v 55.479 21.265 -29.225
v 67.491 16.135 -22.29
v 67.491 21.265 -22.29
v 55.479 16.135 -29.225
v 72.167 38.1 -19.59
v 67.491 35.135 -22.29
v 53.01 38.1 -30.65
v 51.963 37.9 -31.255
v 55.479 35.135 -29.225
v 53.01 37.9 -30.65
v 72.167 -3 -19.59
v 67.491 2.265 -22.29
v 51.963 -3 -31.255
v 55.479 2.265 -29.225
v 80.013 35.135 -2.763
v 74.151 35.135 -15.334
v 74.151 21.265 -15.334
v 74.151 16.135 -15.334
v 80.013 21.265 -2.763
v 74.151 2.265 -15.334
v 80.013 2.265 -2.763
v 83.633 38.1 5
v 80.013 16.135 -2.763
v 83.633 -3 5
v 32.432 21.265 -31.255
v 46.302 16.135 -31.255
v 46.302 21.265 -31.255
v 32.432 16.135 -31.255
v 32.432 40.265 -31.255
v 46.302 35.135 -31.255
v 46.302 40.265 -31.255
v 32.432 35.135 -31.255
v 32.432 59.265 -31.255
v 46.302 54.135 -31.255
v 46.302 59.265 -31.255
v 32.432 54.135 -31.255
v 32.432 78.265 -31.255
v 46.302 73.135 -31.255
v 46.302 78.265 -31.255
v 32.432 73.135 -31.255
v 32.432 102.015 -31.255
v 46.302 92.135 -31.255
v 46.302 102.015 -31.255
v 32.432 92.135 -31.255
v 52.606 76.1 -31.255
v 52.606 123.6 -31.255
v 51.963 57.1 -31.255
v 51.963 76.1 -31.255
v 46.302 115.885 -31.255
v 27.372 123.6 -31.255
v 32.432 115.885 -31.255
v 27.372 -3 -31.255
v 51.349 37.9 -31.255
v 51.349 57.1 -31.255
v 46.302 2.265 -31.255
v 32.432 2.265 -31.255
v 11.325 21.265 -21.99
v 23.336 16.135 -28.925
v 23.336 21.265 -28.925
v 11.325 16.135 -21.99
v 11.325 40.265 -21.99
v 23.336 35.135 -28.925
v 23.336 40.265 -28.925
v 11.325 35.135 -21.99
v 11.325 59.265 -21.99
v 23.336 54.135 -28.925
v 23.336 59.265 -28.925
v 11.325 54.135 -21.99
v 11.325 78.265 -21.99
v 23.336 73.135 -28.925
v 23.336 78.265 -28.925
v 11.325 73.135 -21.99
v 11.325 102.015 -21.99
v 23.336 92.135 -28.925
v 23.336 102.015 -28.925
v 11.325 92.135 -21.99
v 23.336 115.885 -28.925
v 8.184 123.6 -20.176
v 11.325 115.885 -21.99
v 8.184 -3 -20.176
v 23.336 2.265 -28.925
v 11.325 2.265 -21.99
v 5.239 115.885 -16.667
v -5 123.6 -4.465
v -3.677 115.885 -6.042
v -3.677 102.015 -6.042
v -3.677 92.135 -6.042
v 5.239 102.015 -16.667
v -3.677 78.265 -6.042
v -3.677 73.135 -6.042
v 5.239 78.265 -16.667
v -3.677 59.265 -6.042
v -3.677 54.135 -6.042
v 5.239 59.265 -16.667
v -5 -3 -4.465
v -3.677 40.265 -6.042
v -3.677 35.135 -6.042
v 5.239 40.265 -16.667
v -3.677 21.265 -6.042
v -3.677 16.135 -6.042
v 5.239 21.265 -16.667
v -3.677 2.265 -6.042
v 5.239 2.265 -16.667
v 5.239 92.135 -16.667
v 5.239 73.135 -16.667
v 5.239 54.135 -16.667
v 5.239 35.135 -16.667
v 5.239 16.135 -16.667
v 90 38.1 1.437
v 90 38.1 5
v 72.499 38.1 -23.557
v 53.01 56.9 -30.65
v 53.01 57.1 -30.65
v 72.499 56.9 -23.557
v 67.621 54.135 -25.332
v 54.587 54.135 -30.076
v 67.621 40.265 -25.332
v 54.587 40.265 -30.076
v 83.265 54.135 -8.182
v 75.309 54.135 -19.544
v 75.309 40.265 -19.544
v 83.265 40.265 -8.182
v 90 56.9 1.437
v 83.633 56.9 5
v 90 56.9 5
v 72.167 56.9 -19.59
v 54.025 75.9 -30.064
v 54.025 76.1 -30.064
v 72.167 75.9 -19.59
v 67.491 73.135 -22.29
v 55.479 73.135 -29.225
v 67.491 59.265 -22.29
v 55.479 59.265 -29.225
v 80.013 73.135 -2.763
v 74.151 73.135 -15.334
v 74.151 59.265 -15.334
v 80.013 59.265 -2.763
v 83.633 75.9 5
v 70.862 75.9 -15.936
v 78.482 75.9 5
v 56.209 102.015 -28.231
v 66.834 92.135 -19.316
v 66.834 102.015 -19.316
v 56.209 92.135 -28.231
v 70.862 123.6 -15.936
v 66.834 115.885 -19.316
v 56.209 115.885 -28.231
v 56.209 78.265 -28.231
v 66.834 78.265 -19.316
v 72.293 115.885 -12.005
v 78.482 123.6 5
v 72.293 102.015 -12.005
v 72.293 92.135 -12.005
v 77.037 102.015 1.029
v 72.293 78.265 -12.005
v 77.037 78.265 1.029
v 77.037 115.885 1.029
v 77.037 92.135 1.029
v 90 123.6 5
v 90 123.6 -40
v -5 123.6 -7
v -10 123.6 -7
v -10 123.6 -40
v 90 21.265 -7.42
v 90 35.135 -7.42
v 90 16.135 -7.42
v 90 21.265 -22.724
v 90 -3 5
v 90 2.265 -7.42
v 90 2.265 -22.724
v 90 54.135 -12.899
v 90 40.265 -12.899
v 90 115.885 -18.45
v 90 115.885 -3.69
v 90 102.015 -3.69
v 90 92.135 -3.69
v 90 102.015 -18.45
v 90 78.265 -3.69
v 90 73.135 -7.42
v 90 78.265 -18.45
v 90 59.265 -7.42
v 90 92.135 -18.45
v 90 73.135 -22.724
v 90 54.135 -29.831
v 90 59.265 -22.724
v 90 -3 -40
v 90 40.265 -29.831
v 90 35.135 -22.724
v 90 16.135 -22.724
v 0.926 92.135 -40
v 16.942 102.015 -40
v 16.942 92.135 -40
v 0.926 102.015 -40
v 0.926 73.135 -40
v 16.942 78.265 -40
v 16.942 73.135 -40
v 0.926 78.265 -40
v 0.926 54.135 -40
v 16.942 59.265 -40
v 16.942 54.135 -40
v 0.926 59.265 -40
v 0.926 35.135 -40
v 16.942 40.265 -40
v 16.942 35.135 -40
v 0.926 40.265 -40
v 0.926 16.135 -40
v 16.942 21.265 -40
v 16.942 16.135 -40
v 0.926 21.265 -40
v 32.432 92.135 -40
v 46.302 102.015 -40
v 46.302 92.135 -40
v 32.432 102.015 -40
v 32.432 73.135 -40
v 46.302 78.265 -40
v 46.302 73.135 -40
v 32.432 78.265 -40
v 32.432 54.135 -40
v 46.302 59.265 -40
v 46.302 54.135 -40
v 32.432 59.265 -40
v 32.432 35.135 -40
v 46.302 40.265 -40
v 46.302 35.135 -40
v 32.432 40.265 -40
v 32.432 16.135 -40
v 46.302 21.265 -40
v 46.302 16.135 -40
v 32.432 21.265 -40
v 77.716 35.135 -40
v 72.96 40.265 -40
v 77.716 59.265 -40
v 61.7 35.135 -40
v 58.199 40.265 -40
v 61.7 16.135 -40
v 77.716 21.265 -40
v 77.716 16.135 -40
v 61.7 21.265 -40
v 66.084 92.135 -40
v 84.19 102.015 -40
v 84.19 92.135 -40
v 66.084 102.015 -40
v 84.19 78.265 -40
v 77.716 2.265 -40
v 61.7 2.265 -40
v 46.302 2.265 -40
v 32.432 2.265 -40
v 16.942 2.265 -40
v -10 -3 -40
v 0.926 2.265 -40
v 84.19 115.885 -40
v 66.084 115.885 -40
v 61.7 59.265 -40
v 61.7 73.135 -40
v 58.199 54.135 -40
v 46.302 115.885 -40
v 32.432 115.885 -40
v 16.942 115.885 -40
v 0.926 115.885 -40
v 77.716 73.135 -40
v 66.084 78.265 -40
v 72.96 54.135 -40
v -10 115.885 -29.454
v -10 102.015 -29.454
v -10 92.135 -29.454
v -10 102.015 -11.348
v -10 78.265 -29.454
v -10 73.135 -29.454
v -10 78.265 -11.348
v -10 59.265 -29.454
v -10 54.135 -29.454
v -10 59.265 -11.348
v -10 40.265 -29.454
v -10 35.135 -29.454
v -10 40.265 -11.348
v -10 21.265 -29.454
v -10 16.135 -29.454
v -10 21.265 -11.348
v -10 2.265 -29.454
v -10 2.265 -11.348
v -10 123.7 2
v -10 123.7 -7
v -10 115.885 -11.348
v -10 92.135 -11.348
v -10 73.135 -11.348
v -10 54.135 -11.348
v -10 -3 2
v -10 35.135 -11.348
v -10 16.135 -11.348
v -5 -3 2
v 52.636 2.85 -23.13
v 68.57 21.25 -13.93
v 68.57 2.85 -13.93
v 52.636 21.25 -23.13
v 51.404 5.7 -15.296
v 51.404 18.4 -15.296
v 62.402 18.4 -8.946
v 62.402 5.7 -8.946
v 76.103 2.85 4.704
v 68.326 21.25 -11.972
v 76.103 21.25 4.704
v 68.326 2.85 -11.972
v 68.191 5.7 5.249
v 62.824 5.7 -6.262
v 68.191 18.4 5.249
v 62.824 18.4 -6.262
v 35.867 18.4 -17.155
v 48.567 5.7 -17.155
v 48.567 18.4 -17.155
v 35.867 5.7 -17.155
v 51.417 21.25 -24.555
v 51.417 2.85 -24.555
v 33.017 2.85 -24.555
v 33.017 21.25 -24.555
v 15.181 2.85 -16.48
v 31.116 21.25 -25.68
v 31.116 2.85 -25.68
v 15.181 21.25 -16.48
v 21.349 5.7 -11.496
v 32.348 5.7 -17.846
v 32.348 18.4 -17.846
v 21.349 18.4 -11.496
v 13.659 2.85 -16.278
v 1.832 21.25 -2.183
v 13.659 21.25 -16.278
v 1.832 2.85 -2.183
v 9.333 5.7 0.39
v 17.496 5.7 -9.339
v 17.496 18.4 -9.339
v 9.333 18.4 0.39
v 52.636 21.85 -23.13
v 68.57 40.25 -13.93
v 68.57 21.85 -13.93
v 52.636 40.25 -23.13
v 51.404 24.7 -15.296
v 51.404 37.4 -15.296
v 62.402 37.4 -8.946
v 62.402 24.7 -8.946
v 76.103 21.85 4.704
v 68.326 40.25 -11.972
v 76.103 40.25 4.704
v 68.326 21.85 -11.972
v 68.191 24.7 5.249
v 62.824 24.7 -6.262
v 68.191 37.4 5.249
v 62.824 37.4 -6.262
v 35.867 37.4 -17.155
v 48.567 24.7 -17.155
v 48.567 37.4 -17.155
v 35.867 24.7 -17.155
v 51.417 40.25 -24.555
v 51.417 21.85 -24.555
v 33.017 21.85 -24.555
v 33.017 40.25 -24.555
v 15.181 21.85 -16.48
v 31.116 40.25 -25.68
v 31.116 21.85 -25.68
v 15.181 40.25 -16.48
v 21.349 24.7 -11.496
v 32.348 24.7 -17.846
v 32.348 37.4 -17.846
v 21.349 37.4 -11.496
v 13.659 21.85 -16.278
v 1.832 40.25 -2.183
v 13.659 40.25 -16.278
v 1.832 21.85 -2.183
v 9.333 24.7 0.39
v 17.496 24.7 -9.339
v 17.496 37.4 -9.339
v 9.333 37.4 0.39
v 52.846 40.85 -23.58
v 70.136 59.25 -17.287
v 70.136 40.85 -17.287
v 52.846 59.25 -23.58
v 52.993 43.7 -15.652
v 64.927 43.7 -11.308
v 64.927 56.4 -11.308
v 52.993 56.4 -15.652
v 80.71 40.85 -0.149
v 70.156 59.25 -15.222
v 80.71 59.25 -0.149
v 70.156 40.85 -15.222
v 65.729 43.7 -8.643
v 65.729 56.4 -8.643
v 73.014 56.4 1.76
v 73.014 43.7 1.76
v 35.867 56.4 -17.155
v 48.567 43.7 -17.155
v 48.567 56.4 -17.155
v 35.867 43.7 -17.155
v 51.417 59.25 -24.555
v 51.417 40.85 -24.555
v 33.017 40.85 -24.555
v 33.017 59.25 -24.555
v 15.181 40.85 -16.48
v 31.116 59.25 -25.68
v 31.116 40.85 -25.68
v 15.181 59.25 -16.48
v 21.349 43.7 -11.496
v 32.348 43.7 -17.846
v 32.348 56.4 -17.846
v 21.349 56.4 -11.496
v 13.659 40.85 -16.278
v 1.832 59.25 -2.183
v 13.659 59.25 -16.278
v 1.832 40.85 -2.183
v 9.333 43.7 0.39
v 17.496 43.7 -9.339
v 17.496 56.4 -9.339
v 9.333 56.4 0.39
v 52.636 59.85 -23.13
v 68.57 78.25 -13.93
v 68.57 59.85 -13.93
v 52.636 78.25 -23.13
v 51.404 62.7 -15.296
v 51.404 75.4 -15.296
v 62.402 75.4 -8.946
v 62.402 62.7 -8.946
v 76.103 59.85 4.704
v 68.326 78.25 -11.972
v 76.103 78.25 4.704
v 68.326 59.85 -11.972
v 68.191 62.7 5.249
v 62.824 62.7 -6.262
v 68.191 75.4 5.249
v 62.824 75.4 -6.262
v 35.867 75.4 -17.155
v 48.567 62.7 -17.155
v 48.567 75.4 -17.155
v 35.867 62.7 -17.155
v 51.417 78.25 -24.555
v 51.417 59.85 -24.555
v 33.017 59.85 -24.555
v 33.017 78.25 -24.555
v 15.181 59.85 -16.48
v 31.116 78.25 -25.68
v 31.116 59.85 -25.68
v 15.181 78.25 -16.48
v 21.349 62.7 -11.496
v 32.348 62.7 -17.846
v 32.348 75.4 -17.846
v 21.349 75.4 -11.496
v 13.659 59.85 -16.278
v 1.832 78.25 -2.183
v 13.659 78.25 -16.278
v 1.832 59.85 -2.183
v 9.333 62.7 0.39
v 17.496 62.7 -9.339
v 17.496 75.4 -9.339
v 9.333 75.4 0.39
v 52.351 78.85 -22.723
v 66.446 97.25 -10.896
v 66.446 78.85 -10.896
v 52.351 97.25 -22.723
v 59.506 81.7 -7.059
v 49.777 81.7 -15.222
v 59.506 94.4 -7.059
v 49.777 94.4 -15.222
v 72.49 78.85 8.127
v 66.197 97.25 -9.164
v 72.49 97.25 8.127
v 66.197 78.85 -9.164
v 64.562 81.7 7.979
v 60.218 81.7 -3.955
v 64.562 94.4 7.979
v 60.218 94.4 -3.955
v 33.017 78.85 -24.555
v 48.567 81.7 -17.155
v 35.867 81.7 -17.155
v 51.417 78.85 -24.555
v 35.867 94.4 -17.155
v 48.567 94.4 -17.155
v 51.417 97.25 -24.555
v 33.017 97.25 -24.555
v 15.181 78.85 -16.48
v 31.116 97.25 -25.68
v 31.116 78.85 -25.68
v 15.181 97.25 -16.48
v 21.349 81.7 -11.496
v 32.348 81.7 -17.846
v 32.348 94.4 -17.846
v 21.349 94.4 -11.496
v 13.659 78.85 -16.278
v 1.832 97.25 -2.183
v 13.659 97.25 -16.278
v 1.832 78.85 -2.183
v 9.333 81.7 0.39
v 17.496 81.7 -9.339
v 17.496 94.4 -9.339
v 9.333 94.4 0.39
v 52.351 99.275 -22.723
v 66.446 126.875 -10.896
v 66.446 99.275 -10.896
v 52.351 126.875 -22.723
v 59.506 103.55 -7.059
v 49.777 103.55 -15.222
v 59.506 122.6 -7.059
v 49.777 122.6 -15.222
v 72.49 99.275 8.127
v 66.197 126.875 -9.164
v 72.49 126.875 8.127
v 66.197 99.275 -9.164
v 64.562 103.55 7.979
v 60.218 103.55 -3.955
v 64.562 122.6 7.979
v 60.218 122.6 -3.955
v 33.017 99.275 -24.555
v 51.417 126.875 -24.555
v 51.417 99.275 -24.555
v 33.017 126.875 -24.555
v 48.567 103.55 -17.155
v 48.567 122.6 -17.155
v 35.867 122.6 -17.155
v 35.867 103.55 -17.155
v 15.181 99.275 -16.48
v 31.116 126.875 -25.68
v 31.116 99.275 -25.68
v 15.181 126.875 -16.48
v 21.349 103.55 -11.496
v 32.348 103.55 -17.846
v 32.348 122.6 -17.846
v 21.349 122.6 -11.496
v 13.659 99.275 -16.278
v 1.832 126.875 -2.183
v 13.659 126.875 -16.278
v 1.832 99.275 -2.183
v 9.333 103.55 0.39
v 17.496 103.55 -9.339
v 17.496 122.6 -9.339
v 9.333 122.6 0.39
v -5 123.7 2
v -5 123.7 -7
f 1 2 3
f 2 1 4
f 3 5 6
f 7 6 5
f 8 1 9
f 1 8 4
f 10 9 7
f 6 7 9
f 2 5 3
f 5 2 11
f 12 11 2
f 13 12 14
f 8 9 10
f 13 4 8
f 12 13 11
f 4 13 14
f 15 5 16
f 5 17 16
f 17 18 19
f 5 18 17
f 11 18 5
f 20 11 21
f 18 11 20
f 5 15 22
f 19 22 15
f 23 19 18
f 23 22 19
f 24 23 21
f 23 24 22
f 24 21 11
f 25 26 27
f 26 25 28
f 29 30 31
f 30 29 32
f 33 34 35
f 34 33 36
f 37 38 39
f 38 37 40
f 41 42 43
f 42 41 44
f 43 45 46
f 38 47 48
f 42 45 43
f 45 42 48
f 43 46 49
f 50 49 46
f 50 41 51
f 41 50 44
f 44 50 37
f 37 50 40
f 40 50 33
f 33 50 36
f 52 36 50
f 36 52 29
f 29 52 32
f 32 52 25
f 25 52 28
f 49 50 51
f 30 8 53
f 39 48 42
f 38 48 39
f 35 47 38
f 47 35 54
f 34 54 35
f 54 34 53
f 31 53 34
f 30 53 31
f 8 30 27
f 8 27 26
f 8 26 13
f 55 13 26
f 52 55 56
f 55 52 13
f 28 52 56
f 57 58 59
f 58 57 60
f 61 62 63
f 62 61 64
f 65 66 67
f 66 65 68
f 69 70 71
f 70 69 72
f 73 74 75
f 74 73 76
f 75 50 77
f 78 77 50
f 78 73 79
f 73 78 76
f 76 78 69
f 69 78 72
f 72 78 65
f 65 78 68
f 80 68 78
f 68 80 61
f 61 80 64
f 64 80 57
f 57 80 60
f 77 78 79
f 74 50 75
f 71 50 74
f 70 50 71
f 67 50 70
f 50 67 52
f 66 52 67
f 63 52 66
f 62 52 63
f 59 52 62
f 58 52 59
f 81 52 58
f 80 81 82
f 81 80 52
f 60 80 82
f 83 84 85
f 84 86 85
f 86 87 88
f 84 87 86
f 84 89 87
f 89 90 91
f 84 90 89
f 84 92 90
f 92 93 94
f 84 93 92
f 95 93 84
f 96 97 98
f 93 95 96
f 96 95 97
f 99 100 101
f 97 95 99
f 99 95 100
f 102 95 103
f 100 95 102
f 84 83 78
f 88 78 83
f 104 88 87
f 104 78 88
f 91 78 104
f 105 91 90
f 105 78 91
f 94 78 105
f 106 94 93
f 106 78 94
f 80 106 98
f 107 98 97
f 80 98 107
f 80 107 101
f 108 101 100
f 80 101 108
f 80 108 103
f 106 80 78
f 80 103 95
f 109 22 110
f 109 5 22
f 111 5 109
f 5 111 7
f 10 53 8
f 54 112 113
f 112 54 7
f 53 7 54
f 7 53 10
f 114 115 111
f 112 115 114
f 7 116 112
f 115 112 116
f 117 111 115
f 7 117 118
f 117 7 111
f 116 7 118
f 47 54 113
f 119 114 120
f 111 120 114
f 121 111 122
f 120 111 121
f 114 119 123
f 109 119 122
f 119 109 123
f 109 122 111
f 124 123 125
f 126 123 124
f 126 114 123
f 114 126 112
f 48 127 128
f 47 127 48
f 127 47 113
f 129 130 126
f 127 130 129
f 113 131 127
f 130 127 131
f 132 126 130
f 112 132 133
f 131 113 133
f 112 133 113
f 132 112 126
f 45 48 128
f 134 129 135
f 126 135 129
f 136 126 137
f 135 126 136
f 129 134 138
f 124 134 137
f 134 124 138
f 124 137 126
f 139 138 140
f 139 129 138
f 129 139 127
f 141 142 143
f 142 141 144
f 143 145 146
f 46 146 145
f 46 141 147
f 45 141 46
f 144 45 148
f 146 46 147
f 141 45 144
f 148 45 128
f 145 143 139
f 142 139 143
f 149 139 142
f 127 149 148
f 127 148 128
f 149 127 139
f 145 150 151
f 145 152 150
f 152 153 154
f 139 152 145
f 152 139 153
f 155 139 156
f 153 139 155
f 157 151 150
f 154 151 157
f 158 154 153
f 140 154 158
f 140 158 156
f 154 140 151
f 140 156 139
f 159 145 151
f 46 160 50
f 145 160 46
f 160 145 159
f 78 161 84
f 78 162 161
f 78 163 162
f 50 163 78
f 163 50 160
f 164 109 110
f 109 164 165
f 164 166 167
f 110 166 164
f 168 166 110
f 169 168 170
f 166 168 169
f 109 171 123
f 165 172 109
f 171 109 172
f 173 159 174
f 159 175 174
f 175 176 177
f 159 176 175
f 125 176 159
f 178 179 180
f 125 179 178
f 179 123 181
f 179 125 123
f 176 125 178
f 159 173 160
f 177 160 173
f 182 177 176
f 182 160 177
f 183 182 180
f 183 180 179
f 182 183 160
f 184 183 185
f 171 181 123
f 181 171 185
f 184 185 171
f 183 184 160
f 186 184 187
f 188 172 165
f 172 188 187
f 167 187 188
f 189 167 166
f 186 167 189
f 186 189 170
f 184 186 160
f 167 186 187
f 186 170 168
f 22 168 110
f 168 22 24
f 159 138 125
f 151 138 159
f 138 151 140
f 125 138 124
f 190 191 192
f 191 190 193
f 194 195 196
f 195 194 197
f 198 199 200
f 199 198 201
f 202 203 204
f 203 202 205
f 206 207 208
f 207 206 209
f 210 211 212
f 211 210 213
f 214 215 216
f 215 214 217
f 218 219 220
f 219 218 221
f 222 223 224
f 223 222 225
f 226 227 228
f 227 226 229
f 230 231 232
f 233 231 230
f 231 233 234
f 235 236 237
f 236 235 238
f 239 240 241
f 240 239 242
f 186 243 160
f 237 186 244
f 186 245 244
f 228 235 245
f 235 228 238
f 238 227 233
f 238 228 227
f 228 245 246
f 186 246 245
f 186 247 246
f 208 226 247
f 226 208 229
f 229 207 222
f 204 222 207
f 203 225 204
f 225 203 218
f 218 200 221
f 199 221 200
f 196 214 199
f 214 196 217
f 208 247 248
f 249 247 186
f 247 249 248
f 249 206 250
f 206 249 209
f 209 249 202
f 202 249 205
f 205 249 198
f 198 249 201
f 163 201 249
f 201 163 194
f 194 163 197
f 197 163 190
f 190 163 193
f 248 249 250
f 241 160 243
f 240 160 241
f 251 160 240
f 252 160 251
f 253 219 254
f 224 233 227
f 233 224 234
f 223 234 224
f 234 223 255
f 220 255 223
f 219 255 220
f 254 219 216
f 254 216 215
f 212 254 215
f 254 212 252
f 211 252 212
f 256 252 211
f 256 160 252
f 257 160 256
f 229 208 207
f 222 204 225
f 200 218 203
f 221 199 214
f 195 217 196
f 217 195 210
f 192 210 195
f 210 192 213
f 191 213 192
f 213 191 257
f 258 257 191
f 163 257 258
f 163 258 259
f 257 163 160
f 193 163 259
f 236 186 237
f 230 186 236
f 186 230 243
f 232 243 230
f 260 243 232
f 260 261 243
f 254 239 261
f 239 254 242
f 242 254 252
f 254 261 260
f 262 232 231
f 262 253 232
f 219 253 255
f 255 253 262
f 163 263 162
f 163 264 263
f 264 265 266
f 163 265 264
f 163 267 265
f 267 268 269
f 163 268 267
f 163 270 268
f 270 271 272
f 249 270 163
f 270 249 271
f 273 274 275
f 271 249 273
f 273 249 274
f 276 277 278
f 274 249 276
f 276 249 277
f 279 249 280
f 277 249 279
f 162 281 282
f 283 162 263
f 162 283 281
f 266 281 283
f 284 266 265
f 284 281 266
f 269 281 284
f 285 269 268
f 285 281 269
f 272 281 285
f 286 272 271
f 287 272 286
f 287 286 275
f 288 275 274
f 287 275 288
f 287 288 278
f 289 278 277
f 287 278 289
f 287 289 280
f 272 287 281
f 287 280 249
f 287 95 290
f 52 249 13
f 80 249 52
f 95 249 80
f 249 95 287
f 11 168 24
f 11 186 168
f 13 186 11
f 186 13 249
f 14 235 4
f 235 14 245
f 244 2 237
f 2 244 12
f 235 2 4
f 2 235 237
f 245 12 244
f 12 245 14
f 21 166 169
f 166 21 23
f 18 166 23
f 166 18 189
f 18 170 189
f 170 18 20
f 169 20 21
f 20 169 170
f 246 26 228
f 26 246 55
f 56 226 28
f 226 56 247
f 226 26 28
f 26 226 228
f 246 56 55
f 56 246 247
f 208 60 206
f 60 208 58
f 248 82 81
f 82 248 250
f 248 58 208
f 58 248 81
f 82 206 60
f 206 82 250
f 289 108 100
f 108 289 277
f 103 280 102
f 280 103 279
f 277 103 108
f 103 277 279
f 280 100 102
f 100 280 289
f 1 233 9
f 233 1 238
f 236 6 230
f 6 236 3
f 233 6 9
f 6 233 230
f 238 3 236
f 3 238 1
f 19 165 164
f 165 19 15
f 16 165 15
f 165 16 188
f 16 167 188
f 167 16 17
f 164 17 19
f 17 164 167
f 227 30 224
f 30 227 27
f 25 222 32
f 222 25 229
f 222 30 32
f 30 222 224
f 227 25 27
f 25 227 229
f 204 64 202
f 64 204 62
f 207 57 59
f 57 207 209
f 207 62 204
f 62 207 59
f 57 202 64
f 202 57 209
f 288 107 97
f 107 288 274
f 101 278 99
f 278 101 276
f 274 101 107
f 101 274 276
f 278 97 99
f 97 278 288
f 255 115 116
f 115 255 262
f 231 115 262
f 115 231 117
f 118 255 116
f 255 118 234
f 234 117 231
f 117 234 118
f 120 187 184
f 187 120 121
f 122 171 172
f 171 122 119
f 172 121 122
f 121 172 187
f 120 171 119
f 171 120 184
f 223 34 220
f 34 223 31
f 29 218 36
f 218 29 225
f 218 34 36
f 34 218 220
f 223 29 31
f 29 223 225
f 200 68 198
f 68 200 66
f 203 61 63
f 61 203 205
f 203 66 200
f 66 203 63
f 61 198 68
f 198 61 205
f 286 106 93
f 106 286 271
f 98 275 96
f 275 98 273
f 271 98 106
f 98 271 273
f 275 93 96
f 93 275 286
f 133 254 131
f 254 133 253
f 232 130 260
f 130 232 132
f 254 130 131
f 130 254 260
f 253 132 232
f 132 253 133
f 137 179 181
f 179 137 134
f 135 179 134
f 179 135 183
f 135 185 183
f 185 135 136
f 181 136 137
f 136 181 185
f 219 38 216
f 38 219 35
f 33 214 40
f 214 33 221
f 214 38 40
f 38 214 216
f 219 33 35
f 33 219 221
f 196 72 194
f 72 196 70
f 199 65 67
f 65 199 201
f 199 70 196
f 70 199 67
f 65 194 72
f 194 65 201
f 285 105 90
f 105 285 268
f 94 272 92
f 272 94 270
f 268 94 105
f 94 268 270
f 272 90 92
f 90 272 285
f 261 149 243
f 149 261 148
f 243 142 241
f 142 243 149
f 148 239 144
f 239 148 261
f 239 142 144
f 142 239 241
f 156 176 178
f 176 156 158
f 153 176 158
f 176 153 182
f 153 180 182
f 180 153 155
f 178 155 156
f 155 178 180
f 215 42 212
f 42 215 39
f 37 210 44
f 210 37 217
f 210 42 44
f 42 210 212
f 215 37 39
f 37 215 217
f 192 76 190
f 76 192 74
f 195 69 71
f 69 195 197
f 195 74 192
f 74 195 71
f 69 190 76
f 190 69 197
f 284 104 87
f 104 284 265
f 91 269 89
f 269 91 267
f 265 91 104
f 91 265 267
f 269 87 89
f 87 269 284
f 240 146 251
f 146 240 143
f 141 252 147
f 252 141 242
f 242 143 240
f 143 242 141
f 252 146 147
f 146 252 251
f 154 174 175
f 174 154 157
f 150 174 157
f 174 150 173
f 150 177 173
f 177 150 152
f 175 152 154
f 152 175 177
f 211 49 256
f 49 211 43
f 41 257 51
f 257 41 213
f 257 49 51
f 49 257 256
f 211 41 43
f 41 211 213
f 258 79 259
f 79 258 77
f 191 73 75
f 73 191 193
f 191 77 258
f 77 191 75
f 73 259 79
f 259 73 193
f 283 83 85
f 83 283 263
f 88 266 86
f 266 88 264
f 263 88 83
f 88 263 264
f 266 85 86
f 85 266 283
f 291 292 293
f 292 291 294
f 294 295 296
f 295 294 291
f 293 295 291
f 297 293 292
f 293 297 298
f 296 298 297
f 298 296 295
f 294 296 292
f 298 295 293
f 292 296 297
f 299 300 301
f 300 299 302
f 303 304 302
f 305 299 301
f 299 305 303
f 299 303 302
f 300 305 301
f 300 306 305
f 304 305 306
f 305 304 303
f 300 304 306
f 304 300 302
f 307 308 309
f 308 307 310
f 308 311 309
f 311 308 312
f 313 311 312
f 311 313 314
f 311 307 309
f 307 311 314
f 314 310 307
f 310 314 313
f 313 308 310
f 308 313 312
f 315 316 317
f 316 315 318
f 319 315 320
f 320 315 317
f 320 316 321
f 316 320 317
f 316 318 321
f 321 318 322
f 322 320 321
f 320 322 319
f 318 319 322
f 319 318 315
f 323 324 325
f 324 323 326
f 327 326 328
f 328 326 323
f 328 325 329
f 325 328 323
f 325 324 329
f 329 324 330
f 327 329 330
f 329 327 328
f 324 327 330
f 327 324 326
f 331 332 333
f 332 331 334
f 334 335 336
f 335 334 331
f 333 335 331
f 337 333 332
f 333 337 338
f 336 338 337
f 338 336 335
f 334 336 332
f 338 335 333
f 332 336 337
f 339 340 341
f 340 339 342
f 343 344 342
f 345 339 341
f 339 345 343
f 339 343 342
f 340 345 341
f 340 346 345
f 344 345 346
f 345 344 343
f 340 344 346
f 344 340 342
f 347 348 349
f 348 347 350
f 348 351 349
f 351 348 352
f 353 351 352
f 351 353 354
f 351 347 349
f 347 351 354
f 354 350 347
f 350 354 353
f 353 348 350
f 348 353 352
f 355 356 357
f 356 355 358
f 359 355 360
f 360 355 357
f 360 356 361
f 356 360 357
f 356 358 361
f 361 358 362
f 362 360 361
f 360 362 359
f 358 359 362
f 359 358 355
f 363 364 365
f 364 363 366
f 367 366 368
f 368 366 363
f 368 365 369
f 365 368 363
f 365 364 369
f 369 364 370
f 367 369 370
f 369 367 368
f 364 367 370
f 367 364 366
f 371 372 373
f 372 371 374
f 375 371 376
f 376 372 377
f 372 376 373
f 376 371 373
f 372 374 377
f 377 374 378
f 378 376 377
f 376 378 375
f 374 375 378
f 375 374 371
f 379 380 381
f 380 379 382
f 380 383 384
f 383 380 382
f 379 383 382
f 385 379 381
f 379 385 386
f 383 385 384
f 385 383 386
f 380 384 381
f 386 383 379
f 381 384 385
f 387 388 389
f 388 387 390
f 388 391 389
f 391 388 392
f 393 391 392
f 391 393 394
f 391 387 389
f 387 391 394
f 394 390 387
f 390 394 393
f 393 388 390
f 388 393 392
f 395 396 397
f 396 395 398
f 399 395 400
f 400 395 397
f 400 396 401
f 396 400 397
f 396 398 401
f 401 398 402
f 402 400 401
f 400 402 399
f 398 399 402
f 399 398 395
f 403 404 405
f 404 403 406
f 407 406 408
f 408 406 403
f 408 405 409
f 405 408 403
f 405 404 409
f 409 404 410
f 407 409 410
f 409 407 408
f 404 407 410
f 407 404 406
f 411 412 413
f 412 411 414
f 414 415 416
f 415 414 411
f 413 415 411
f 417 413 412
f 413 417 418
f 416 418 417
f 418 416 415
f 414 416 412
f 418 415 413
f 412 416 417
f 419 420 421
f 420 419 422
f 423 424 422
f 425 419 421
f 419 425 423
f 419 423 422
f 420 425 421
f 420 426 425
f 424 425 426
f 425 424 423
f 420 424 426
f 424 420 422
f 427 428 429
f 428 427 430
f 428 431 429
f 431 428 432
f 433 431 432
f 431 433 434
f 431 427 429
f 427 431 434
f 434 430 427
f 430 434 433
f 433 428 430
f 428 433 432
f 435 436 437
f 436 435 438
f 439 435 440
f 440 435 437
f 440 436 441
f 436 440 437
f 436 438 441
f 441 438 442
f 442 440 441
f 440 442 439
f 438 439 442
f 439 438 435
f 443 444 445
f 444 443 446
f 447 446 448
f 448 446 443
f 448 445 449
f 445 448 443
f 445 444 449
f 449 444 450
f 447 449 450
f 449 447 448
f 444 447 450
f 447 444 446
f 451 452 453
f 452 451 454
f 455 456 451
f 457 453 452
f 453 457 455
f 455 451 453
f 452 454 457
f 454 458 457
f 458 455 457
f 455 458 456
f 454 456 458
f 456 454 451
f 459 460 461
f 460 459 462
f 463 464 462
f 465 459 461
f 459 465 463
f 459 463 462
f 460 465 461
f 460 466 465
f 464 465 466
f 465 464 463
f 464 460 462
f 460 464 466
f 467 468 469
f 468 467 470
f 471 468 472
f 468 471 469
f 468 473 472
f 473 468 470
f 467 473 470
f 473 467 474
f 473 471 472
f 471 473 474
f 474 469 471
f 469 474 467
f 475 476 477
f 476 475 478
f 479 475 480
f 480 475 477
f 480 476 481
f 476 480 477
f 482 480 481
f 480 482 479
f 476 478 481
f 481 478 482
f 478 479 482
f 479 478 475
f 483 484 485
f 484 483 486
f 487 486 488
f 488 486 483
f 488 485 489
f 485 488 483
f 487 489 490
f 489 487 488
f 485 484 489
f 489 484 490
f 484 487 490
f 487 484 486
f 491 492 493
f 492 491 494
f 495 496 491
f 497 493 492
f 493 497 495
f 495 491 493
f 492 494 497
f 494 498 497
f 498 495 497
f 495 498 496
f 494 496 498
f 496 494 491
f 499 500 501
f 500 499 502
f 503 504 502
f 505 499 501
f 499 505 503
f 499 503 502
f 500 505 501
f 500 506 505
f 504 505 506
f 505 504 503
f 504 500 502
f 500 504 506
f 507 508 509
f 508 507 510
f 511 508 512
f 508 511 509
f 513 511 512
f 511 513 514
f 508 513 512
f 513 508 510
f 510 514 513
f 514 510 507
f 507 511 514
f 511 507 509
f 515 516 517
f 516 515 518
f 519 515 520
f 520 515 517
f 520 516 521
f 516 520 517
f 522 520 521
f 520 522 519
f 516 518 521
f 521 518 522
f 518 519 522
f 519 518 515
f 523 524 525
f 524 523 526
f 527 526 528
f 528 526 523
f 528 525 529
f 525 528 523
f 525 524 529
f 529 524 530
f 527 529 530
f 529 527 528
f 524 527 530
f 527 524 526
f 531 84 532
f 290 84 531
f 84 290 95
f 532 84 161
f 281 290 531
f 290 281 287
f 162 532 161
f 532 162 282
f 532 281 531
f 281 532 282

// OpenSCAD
// file: column.scad
include <../common.scad>;


module column_var_size(type, angles, offsets_x, offsets_z, width, enabled) {
    if (enabled[0]) {
        key(angles[0], type, width);
        if (enabled[1]) translate([SINGLE * cos(angles[0]) + offsets_x[0], 0, -SINGLE * sin(angles[0]) + offsets_z[0]]) {
            key(angles[1], type, width);
            if (enabled[2]) translate([SINGLE * cos(angles[1]) + offsets_x[1], 0, -SINGLE * sin(angles[1]) + offsets_z[1]]) {
                key(angles[2], type, width);
                if (enabled[3]) translate([SINGLE * cos(angles[2]) + offsets_x[2], 0, -SINGLE * sin(angles[2]) + offsets_z[2]]) {
                    key(angles[3], type, width);
                    if (enabled[4]) translate([SINGLE * cos(angles[3]) + offsets_x[3], 0, -SINGLE * sin(angles[3]) + offsets_z[3]]) {
                        key(angles[4], type, width);
                    }
                }
            }
        }
    }
}


module column5(type, angles, offsets_x, offsets_z, width=SINGLE) {
    column_var_size(type, angles, offsets_x, offsets_z, width, [true, true, true, true, true]);
}


module column4(type, angles, offsets_x, offsets_z, width=SINGLE) {
    column_var_size(type, angles, offsets_x, offsets_z, width, [true, true, true, true, false]);
}


module column3(type, angles, offsets_x, offsets_z, width=SINGLE) {
    column_var_size(type, angles, offsets_x, offsets_z, width, [true, true, true, false, false]);
}
// file: ../keycaps/dsa.scad
include <../common.scad>


// DSA keycap top width.
DSA_TOP_WIDTH = 12.7;
// DSA keycap height.
DSA_HEIGHT = 7.4;

USE_SIMPLIFIED_KEYS = true;


module key_base(type, width, is_simplified=USE_SIMPLIFIED_KEYS) {
    if (type == 0) {
        // A simple way to produce 1.5 and double horizontal keys.
        resize([KEY_WIDTH, KEY_WIDTH * width / SINGLE, DSA_HEIGHT]) {
            // Simplified geometry is much faster to render.
            if (is_simplified) {
                WN_OFFSET = (KEY_WIDTH - DSA_TOP_WIDTH) / 2;
                // Draw a keycap as a big bottom and a smaller top squares
                // connected by 4 side faces.
                // TODO: why do we use this translation?
                translate([WN_OFFSET, WN_OFFSET, 0]) {
                    // cube([DSA_TOP_WIDTH, DSA_TOP_WIDTH, DSA_HEIGHT]);
                    polyhedron(
                        points=[
                            // Bottom
                            [0, 0, 0],
                            [KEY_WIDTH, 0, 0],
                            [KEY_WIDTH, KEY_WIDTH, 0],
                            [0, KEY_WIDTH, 0],
                            // Top
                            [WN_OFFSET, WN_OFFSET, DSA_HEIGHT],
                            [WN_OFFSET + DSA_TOP_WIDTH, WN_OFFSET, DSA_HEIGHT],
                            [WN_OFFSET + DSA_TOP_WIDTH, WN_OFFSET + DSA_TOP_WIDTH, DSA_HEIGHT],
                            [WN_OFFSET, WN_OFFSET + DSA_TOP_WIDTH, DSA_HEIGHT],
                        ],
                        faces=[
                            // Bottom
                            [0, 1, 2],
                            [2, 3, 0],
                            // Top
                            [5, 4, 6],
                            [6, 4, 7],
                            // Sides
                            [0, 4, 1],
                            [4, 5, 1],
                            [1, 5, 2],
                            [5, 6, 2],
                            [2, 6, 3],
                            [6, 7, 3],
                            [3, 7, 0],
                            [7, 4, 0]
                        ]
                    );
                }
            }
            else {
                KEYCAP_OFFSET = -1;
                translate([KEY_WIDTH / 2, KEY_WIDTH / 2, KEYCAP_OFFSET]) {
                    import("./keycaps/mx_dsa.stl");
                }
            }
        }
    } else if (type == 1) {
        // We use a hack for 3D cases construction: each key leaves a block
        // just behind itself that formes a support for it. The union
        // of blocks for keys can be than intersected with a cube in order
        // to shape the case block.
        CASE_EXTRUSION_DEPTH = 200;
        // TODO: comment and clean.
        translate([-KEY_WIDTH, -0.1, -CASE_EXTRUSION_DEPTH - KEYCAP_TO_PLATE_OFFSET]) {
            cube([4 * KEY_WIDTH, width + 0.2, CASE_EXTRUSION_DEPTH]);
        }
    } else if (type == 2) {
        // If key is bigger than single, the additional key size should be
        // split in two and added to the left and to the right of the hole.
        // This code works correctly only with horizontal keys.
        translate([0, (width - SINGLE) / 2, 0]) {
            // The standard offset between a single keycap contour and the
            // corresponding hole.
            HOLE_OFFSET = (KEY_WIDTH - HOLE_SIZE) / 2;
            // How deep the hole should be cut? It may be necessary
            // to increase this parameter for more bulky keyboard cases.
            HOLE_HEIGHT = 40;
            // We move the hole by 1 mm above the requested position in order
            // to avoid non noded geometries intersections.
            translate([HOLE_OFFSET, HOLE_OFFSET, -HOLE_HEIGHT + 1]) {
                cube([HOLE_SIZE, HOLE_SIZE, HOLE_HEIGHT]);
            }
        }
    }
}


module key(angle, type, width) {
    rotate(angle, [0, 1, 0]) key_base(type, width);
}
// file: ../common.scad
// Standard keycap size unit.
KEY_WIDTH = 18.4;
KEYCAP_TO_PLATE_OFFSET = 6.7;

// Standard spacing between keys.
SINGLE = 19;
SINGLE_AND_HALF = SINGLE * 1.5;
DOUBLE = SINGLE * 2;

// Cherry MX hole width.
STANDARD_HOLE_SIZE = 13.97;
// Adjusted hole width for tighter keys fit.
HOLE_SIZE_ADJUSTMENT = -0.1;
HOLE_SIZE = STANDARD_HOLE_SIZE + HOLE_SIZE_ADJUSTMENT;
// main file
include <../common.scad>;
include <../keycaps/dsa.scad>;
include <column.scad>;


module keyboard_old(with_keys=false) {
    angles = [
        [50, 30, 0, -30, -65],
        [50, 30, 0, -30, -65],
        [50, 30, 0, -20, -55],
        [50, 30, 0, -30, -65],
        [50, 30, 0, -40, -70],
        [50, 30, 0, -40, -70]
    ];
    offsets_x = [0.5, 1, 1, 0.5];
    offsets_z = [-0.5, 0, 0, 0.5];

    translate([0, 0, 0]) {
        translate([-10, -3, -7]) cube([5, 126.7, 9]);
        difference() {
            intersection() {
                translate([-10, -3, -40]) cube([100, 130, 45]);
                union() {
                    for (i = [0:4]) {
                        translate([0, SINGLE * i, 0]) column5(1, angles[i], offsets_x, offsets_z);
                    }
                    translate([0, SINGLE * 5, 0]) column5(1, angles[5], offsets_x, offsets_z, SINGLE_AND_HALF);
                    translate([0, -3, 0]) column5(1, angles[0], offsets_x, offsets_z);
                }
            }
            union() {
                for (i = [0:4]) {
                    translate([0, SINGLE * i, 0]) column5(2, angles[i], offsets_x, offsets_z);
                }
                translate([0, SINGLE * 5, 0]) column5(2, angles[5], offsets_x, offsets_z, SINGLE_AND_HALF);
            }
        }

        if (with_keys) {
            for (i = [0:4]) {
                translate([0, SINGLE * i, 0]) column5(0, angles[i], offsets_x, offsets_z);
            }
            translate([0, SINGLE * 5, 0]) column5(0, angles[5], offsets_x, offsets_z, SINGLE_AND_HALF);
        }
    }
}


keyboard_old(true);
